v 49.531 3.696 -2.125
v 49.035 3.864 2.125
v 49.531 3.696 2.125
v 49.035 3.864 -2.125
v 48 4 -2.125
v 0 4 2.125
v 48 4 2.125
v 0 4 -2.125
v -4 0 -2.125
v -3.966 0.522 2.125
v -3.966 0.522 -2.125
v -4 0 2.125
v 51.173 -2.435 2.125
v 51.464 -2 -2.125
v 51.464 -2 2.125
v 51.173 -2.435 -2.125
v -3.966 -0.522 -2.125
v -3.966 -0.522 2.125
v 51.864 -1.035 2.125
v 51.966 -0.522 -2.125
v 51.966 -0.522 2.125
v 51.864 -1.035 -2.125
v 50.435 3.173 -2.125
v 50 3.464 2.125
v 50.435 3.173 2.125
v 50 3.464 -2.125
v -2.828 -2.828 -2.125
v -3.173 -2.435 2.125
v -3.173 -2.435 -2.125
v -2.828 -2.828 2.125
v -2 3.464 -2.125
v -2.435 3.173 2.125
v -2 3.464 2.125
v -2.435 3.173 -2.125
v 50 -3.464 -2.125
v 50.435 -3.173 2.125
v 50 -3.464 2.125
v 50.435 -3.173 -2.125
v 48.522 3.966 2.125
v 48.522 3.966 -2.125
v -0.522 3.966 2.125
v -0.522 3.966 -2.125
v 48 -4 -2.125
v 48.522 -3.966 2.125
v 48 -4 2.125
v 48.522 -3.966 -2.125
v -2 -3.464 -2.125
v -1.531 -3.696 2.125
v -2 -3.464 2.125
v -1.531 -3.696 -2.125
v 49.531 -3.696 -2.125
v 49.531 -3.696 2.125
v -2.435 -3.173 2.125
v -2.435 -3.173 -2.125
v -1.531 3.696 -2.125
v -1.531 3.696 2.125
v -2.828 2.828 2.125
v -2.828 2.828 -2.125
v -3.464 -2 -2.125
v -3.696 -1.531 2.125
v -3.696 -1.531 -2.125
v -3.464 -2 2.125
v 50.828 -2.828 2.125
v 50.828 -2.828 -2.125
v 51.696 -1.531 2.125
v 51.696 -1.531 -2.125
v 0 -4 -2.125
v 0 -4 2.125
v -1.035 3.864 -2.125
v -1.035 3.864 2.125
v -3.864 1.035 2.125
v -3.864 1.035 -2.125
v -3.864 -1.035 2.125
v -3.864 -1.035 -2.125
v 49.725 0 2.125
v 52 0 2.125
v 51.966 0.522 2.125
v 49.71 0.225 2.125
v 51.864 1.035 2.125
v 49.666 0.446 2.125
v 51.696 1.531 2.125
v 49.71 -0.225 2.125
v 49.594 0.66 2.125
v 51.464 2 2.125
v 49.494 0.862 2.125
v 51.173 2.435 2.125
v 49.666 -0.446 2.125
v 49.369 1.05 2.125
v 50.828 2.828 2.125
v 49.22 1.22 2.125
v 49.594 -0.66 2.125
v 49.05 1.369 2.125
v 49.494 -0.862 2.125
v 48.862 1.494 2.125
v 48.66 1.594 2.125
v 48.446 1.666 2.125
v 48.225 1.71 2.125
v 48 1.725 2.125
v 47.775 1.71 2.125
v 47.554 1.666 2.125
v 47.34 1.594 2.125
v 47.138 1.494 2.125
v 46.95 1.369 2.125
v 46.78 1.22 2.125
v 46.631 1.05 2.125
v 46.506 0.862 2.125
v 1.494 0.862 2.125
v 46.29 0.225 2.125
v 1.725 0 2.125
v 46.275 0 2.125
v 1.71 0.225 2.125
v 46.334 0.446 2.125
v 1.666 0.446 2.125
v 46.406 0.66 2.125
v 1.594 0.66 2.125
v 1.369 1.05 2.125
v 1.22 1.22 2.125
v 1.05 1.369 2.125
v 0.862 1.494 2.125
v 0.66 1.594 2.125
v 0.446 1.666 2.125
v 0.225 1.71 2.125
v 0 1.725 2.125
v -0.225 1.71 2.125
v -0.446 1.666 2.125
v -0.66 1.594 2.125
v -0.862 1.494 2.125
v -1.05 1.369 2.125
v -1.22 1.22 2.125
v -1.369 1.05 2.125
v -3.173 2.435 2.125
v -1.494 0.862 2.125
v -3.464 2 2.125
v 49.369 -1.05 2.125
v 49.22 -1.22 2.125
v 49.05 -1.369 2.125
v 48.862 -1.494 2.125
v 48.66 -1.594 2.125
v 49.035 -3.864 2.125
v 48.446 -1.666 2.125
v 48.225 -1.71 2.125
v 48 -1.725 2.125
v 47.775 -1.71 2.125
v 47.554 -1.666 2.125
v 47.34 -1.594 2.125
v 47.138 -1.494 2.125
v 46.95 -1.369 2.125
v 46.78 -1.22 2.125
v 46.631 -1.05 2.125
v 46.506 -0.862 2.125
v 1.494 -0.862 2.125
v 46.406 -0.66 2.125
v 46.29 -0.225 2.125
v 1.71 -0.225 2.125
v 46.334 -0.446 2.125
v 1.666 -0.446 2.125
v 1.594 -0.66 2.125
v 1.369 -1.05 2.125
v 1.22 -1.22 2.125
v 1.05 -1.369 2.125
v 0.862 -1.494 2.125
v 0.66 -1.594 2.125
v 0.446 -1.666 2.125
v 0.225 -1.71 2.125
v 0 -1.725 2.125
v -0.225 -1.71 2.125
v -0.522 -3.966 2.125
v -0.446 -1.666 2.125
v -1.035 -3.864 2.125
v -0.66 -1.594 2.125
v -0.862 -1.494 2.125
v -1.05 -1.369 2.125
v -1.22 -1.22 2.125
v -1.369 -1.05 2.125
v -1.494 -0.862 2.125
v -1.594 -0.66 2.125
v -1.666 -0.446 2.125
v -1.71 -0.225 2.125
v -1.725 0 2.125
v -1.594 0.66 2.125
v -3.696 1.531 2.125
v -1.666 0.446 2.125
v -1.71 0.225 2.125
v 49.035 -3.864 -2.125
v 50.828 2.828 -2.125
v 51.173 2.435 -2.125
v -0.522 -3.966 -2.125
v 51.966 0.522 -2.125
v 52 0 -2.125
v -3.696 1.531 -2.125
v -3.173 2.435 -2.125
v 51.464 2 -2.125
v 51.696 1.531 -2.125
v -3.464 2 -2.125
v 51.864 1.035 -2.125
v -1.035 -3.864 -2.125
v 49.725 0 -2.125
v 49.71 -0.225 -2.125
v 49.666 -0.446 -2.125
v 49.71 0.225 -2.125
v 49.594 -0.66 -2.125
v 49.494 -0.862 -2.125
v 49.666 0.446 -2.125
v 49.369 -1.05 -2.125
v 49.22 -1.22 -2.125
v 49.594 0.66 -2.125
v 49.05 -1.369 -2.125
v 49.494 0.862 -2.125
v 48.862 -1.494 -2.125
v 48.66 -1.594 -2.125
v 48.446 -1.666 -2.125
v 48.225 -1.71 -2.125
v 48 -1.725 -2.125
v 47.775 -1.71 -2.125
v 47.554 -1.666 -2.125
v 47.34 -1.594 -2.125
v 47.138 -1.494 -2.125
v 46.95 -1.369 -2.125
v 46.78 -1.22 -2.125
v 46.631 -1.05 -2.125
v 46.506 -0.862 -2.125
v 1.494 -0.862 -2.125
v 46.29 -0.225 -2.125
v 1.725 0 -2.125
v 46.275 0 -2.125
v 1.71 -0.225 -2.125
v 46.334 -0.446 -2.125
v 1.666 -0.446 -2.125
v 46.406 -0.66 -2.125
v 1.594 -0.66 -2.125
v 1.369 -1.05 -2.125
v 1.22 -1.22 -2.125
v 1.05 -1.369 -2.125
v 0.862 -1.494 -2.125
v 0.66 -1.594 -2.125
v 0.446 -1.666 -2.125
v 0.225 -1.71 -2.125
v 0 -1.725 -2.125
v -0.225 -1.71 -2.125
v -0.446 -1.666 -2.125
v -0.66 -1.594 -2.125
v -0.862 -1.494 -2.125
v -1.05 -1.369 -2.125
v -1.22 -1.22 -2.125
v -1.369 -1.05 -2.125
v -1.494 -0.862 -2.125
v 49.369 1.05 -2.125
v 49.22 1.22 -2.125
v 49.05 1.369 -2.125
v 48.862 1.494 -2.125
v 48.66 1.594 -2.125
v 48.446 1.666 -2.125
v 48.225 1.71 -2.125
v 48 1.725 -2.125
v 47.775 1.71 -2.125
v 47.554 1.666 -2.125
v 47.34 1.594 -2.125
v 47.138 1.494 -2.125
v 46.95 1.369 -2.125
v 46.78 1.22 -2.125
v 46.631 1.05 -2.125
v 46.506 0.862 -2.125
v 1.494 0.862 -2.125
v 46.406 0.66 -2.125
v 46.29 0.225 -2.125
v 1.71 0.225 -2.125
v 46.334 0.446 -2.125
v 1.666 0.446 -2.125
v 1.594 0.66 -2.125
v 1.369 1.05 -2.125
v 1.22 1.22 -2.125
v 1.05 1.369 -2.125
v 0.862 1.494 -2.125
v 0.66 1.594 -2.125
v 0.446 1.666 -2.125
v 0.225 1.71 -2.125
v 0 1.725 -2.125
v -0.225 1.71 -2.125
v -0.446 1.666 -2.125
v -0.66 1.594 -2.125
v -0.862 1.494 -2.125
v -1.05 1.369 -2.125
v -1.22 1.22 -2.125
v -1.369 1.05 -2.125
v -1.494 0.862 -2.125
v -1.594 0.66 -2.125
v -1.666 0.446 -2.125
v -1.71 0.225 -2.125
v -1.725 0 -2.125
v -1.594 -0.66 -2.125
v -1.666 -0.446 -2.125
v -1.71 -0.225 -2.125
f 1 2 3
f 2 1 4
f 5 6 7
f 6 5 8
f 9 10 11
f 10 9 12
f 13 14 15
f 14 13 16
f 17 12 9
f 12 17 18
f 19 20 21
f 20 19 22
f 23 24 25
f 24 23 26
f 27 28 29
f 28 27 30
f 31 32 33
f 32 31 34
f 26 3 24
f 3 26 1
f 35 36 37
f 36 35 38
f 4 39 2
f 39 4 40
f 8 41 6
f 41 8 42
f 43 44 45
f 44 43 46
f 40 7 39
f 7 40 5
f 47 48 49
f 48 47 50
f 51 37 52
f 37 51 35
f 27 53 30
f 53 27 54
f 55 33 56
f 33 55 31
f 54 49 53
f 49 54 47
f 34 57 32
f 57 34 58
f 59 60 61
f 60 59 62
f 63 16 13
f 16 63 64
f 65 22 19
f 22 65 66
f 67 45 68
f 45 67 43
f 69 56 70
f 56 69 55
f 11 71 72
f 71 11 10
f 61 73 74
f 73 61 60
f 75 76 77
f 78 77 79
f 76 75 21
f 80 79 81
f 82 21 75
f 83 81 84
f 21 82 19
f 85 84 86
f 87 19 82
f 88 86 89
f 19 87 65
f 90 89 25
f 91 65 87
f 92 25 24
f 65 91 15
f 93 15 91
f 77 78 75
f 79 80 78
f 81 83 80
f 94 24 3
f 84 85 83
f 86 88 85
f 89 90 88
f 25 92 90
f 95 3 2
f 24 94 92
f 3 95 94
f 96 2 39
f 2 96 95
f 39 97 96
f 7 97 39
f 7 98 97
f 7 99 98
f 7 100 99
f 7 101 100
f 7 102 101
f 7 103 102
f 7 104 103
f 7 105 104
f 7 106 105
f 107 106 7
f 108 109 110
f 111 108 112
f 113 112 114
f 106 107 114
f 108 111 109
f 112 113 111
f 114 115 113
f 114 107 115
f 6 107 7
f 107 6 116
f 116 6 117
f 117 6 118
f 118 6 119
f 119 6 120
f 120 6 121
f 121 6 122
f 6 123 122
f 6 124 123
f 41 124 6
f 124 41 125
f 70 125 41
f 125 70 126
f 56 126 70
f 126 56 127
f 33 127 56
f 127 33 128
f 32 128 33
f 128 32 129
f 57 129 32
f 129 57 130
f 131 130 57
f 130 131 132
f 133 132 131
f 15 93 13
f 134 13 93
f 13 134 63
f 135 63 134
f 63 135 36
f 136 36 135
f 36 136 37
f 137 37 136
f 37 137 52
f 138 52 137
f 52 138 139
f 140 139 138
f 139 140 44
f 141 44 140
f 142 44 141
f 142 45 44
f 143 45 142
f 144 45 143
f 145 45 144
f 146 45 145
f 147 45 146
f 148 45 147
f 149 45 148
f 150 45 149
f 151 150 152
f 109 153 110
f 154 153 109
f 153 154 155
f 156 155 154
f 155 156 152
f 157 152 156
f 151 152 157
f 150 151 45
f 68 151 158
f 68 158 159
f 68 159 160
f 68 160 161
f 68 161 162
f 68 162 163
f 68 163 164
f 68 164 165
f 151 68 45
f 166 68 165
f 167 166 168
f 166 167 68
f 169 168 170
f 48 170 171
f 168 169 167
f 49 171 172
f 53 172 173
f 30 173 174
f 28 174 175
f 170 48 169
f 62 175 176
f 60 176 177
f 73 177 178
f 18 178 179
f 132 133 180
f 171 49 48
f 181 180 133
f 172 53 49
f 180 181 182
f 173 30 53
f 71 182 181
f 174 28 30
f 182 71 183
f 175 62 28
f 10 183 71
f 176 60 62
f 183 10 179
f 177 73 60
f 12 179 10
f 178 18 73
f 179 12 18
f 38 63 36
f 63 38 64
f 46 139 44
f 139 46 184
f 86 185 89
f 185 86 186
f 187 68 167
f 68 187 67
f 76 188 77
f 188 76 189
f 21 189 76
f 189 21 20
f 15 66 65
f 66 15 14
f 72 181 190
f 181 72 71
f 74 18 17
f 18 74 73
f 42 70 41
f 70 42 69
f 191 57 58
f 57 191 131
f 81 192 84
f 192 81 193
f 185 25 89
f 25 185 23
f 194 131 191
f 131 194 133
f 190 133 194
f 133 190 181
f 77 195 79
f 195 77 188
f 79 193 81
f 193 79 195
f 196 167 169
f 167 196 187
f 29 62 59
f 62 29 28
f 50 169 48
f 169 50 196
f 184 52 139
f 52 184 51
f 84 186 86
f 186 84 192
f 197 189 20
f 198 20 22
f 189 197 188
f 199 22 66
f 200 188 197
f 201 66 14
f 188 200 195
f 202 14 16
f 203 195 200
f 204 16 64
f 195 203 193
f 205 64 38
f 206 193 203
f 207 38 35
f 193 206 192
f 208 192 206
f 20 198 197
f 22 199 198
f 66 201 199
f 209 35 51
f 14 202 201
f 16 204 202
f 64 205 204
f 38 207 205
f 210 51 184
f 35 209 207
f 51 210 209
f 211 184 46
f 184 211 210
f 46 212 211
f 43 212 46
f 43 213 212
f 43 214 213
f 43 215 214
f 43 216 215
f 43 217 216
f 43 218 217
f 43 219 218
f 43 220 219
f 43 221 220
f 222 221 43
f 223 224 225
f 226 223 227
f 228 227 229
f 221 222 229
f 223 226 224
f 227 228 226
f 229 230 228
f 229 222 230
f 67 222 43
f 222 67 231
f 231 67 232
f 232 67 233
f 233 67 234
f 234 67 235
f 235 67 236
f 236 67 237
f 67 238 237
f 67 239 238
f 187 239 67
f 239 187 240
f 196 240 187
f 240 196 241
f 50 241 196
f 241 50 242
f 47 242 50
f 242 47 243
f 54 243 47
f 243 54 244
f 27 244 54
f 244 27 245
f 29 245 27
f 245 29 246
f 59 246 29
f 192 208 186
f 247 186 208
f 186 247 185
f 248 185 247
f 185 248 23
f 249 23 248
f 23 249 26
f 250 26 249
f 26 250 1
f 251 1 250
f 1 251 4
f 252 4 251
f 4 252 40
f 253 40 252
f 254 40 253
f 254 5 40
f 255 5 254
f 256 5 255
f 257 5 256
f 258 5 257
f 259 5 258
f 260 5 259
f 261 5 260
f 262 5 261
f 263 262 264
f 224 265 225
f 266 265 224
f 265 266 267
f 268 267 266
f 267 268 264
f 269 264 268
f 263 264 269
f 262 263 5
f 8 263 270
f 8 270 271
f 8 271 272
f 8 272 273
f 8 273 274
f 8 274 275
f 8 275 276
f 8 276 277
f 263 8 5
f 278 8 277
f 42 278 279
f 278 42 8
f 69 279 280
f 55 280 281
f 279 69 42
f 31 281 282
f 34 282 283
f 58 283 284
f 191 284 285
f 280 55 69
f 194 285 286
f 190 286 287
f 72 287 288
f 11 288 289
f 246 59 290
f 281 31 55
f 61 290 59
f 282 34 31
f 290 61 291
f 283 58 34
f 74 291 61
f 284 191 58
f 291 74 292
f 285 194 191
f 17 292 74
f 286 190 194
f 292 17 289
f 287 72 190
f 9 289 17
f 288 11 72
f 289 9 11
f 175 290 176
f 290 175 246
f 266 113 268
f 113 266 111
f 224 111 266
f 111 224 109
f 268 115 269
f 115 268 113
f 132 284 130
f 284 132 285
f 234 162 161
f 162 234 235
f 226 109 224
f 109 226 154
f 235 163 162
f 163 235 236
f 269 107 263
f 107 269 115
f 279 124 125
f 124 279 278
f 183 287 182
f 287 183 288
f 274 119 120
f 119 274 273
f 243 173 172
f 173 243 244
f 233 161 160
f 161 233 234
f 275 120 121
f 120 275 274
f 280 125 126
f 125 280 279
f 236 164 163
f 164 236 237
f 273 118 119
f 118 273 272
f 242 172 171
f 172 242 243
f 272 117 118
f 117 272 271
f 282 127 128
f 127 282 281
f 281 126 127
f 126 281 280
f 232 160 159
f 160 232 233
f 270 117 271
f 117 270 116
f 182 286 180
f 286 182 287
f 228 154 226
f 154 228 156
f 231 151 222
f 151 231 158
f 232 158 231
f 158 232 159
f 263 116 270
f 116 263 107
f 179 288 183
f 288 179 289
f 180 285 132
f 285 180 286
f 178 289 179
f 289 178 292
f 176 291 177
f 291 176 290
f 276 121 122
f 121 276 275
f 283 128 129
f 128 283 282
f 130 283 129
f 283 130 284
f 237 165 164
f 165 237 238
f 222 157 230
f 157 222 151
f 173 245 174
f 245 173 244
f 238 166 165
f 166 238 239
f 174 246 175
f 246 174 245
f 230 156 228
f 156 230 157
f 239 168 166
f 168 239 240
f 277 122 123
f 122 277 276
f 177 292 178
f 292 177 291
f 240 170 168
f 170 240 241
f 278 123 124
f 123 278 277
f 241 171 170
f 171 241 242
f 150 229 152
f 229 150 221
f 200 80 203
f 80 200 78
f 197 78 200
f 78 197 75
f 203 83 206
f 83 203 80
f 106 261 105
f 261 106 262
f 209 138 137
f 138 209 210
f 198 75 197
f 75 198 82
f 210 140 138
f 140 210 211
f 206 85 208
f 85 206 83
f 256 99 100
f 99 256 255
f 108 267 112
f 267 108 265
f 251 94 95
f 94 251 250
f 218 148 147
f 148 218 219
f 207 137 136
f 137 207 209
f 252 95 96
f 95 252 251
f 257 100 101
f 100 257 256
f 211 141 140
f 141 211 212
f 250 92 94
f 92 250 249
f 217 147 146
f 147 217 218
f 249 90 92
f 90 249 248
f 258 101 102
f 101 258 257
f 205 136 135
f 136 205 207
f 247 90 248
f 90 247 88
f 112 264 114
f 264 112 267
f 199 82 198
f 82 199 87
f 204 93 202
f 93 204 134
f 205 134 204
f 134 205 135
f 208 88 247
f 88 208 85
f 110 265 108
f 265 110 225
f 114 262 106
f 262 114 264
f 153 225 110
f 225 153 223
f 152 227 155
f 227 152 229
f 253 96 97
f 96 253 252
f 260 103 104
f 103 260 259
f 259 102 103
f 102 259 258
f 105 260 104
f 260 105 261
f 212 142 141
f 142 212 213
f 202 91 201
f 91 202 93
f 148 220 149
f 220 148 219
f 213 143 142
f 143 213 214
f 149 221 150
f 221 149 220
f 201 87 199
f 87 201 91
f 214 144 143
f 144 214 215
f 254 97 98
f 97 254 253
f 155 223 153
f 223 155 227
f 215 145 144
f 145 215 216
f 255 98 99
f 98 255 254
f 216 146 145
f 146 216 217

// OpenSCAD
// file: ../params.scad
// Vexamicus T0/T1 parametric dimensions (mm)
// Inspired by published Salto-class proportions — original geometry, not a CAD clone.

/* [Scale] */
// Overall linear scale vs nominal T1 (1.0 ≈ 240 mm body height class)
SCALE = 1.0;

/* [Body] */
BODY_W = 42 * SCALE;      // Y width
BODY_H = 38 * SCALE;      // Z height of core block
BODY_L = 55 * SCALE;      // X length
WALL = 2.4 * SCALE;
BATTERY_L = 48 * SCALE;
BATTERY_W = 18 * SCALE;
BATTERY_H = 14 * SCALE;

/* [Leg 4-bar] */
HIP_Z = -8 * SCALE;                 // hip joint below body center
FEMUR_L = 55 * SCALE;               // hip → knee
SHIN_L = 70 * SCALE;                // knee → foot
COUPLER_L = 48 * SCALE;             // parallel coupler
CRANK_L = 18 * SCALE;               // SEA output crank
LEG_THICK = 5 * SCALE;
LEG_WIDTH = 8 * SCALE;
BEARING_ID = 3.2;                   // M3 clearance
BEARING_OD = 10.0;                  // 623-ish pocket (simplified)

/* [Foot] */
TOE_R = 12 * SCALE;
ANKLE_PAD_H = 6 * SCALE;

/* [SEA hub] */
SEA_HUB_R = 16 * SCALE;
SEA_HUB_H = 12 * SCALE;
MOTOR_BORE = 5.2;                   // typical BLDC shaft
SPRING_SLOT_W = 4.5 * SCALE;

/* [Tail / reaction wheel] */
TAIL_BOOM_L = 35 * SCALE;
TAIL_WHEEL_R = 28 * SCALE;
TAIL_WHEEL_H = 8 * SCALE;
TAIL_SHAFT = 3.2;

/* [Thruster booms T2] */
THRUST_BOOM_L = 45 * SCALE;
THRUST_ARM_ROLL = 40 * SCALE;       // ~ half of Salto 80mm moment arm at SCALE~1
THRUST_MOTOR_R = 6 * SCALE;

/* [Clearance / print] */
CLEAR = 0.25;
$fn = 48;

function mm(x) = x;
// file: ../vitamins.scad
// Shared primitives
include <params.scad>

module round_rect(size, r=1.5, center=false) {
    // size = [x,y,z]
    x=size[0]; y=size[1]; z=size[2];
    translate(center ? [-x/2,-y/2,-z/2] : [0,0,0])
    minkowski() {
        cube([max(0.01,x-2*r), max(0.01,y-2*r), max(0.01,z)], center=false);
        cylinder(r=r, h=0.01, center=false);
    }
}

module bearing_pocket(h=LEG_THICK+0.2) {
    cylinder(d=BEARING_OD + CLEAR, h=h, center=true);
}

module bolt_hole(d=BEARING_ID, h=40) {
    cylinder(d=d + CLEAR, h=h, center=true);
}

module carbon_tube(L=50, od=4, id=3) {
    difference() {
        cylinder(d=od, h=L, center=true);
        cylinder(d=id, h=L+1, center=true);
    }
}

module motor_standoff_pattern(spacing=16, h=6, d=2.2) {
    for (a=[0:90:270])
        rotate([0,0,a]) translate([spacing/2,0,0])
            cylinder(d=d, h=h, center=true);
}
// main file
// Coupler (parallelogram assist)
include <../vitamins.scad>

module coupler() {
    L = COUPLER_L;
    difference() {
        hull() {
            cylinder(d=LEG_WIDTH, h=LEG_THICK*0.85, center=true);
            translate([L,0,0]) cylinder(d=LEG_WIDTH, h=LEG_THICK*0.85, center=true);
        }
        bolt_hole();
        translate([L,0,0]) bolt_hole();
    }
}

coupler();
